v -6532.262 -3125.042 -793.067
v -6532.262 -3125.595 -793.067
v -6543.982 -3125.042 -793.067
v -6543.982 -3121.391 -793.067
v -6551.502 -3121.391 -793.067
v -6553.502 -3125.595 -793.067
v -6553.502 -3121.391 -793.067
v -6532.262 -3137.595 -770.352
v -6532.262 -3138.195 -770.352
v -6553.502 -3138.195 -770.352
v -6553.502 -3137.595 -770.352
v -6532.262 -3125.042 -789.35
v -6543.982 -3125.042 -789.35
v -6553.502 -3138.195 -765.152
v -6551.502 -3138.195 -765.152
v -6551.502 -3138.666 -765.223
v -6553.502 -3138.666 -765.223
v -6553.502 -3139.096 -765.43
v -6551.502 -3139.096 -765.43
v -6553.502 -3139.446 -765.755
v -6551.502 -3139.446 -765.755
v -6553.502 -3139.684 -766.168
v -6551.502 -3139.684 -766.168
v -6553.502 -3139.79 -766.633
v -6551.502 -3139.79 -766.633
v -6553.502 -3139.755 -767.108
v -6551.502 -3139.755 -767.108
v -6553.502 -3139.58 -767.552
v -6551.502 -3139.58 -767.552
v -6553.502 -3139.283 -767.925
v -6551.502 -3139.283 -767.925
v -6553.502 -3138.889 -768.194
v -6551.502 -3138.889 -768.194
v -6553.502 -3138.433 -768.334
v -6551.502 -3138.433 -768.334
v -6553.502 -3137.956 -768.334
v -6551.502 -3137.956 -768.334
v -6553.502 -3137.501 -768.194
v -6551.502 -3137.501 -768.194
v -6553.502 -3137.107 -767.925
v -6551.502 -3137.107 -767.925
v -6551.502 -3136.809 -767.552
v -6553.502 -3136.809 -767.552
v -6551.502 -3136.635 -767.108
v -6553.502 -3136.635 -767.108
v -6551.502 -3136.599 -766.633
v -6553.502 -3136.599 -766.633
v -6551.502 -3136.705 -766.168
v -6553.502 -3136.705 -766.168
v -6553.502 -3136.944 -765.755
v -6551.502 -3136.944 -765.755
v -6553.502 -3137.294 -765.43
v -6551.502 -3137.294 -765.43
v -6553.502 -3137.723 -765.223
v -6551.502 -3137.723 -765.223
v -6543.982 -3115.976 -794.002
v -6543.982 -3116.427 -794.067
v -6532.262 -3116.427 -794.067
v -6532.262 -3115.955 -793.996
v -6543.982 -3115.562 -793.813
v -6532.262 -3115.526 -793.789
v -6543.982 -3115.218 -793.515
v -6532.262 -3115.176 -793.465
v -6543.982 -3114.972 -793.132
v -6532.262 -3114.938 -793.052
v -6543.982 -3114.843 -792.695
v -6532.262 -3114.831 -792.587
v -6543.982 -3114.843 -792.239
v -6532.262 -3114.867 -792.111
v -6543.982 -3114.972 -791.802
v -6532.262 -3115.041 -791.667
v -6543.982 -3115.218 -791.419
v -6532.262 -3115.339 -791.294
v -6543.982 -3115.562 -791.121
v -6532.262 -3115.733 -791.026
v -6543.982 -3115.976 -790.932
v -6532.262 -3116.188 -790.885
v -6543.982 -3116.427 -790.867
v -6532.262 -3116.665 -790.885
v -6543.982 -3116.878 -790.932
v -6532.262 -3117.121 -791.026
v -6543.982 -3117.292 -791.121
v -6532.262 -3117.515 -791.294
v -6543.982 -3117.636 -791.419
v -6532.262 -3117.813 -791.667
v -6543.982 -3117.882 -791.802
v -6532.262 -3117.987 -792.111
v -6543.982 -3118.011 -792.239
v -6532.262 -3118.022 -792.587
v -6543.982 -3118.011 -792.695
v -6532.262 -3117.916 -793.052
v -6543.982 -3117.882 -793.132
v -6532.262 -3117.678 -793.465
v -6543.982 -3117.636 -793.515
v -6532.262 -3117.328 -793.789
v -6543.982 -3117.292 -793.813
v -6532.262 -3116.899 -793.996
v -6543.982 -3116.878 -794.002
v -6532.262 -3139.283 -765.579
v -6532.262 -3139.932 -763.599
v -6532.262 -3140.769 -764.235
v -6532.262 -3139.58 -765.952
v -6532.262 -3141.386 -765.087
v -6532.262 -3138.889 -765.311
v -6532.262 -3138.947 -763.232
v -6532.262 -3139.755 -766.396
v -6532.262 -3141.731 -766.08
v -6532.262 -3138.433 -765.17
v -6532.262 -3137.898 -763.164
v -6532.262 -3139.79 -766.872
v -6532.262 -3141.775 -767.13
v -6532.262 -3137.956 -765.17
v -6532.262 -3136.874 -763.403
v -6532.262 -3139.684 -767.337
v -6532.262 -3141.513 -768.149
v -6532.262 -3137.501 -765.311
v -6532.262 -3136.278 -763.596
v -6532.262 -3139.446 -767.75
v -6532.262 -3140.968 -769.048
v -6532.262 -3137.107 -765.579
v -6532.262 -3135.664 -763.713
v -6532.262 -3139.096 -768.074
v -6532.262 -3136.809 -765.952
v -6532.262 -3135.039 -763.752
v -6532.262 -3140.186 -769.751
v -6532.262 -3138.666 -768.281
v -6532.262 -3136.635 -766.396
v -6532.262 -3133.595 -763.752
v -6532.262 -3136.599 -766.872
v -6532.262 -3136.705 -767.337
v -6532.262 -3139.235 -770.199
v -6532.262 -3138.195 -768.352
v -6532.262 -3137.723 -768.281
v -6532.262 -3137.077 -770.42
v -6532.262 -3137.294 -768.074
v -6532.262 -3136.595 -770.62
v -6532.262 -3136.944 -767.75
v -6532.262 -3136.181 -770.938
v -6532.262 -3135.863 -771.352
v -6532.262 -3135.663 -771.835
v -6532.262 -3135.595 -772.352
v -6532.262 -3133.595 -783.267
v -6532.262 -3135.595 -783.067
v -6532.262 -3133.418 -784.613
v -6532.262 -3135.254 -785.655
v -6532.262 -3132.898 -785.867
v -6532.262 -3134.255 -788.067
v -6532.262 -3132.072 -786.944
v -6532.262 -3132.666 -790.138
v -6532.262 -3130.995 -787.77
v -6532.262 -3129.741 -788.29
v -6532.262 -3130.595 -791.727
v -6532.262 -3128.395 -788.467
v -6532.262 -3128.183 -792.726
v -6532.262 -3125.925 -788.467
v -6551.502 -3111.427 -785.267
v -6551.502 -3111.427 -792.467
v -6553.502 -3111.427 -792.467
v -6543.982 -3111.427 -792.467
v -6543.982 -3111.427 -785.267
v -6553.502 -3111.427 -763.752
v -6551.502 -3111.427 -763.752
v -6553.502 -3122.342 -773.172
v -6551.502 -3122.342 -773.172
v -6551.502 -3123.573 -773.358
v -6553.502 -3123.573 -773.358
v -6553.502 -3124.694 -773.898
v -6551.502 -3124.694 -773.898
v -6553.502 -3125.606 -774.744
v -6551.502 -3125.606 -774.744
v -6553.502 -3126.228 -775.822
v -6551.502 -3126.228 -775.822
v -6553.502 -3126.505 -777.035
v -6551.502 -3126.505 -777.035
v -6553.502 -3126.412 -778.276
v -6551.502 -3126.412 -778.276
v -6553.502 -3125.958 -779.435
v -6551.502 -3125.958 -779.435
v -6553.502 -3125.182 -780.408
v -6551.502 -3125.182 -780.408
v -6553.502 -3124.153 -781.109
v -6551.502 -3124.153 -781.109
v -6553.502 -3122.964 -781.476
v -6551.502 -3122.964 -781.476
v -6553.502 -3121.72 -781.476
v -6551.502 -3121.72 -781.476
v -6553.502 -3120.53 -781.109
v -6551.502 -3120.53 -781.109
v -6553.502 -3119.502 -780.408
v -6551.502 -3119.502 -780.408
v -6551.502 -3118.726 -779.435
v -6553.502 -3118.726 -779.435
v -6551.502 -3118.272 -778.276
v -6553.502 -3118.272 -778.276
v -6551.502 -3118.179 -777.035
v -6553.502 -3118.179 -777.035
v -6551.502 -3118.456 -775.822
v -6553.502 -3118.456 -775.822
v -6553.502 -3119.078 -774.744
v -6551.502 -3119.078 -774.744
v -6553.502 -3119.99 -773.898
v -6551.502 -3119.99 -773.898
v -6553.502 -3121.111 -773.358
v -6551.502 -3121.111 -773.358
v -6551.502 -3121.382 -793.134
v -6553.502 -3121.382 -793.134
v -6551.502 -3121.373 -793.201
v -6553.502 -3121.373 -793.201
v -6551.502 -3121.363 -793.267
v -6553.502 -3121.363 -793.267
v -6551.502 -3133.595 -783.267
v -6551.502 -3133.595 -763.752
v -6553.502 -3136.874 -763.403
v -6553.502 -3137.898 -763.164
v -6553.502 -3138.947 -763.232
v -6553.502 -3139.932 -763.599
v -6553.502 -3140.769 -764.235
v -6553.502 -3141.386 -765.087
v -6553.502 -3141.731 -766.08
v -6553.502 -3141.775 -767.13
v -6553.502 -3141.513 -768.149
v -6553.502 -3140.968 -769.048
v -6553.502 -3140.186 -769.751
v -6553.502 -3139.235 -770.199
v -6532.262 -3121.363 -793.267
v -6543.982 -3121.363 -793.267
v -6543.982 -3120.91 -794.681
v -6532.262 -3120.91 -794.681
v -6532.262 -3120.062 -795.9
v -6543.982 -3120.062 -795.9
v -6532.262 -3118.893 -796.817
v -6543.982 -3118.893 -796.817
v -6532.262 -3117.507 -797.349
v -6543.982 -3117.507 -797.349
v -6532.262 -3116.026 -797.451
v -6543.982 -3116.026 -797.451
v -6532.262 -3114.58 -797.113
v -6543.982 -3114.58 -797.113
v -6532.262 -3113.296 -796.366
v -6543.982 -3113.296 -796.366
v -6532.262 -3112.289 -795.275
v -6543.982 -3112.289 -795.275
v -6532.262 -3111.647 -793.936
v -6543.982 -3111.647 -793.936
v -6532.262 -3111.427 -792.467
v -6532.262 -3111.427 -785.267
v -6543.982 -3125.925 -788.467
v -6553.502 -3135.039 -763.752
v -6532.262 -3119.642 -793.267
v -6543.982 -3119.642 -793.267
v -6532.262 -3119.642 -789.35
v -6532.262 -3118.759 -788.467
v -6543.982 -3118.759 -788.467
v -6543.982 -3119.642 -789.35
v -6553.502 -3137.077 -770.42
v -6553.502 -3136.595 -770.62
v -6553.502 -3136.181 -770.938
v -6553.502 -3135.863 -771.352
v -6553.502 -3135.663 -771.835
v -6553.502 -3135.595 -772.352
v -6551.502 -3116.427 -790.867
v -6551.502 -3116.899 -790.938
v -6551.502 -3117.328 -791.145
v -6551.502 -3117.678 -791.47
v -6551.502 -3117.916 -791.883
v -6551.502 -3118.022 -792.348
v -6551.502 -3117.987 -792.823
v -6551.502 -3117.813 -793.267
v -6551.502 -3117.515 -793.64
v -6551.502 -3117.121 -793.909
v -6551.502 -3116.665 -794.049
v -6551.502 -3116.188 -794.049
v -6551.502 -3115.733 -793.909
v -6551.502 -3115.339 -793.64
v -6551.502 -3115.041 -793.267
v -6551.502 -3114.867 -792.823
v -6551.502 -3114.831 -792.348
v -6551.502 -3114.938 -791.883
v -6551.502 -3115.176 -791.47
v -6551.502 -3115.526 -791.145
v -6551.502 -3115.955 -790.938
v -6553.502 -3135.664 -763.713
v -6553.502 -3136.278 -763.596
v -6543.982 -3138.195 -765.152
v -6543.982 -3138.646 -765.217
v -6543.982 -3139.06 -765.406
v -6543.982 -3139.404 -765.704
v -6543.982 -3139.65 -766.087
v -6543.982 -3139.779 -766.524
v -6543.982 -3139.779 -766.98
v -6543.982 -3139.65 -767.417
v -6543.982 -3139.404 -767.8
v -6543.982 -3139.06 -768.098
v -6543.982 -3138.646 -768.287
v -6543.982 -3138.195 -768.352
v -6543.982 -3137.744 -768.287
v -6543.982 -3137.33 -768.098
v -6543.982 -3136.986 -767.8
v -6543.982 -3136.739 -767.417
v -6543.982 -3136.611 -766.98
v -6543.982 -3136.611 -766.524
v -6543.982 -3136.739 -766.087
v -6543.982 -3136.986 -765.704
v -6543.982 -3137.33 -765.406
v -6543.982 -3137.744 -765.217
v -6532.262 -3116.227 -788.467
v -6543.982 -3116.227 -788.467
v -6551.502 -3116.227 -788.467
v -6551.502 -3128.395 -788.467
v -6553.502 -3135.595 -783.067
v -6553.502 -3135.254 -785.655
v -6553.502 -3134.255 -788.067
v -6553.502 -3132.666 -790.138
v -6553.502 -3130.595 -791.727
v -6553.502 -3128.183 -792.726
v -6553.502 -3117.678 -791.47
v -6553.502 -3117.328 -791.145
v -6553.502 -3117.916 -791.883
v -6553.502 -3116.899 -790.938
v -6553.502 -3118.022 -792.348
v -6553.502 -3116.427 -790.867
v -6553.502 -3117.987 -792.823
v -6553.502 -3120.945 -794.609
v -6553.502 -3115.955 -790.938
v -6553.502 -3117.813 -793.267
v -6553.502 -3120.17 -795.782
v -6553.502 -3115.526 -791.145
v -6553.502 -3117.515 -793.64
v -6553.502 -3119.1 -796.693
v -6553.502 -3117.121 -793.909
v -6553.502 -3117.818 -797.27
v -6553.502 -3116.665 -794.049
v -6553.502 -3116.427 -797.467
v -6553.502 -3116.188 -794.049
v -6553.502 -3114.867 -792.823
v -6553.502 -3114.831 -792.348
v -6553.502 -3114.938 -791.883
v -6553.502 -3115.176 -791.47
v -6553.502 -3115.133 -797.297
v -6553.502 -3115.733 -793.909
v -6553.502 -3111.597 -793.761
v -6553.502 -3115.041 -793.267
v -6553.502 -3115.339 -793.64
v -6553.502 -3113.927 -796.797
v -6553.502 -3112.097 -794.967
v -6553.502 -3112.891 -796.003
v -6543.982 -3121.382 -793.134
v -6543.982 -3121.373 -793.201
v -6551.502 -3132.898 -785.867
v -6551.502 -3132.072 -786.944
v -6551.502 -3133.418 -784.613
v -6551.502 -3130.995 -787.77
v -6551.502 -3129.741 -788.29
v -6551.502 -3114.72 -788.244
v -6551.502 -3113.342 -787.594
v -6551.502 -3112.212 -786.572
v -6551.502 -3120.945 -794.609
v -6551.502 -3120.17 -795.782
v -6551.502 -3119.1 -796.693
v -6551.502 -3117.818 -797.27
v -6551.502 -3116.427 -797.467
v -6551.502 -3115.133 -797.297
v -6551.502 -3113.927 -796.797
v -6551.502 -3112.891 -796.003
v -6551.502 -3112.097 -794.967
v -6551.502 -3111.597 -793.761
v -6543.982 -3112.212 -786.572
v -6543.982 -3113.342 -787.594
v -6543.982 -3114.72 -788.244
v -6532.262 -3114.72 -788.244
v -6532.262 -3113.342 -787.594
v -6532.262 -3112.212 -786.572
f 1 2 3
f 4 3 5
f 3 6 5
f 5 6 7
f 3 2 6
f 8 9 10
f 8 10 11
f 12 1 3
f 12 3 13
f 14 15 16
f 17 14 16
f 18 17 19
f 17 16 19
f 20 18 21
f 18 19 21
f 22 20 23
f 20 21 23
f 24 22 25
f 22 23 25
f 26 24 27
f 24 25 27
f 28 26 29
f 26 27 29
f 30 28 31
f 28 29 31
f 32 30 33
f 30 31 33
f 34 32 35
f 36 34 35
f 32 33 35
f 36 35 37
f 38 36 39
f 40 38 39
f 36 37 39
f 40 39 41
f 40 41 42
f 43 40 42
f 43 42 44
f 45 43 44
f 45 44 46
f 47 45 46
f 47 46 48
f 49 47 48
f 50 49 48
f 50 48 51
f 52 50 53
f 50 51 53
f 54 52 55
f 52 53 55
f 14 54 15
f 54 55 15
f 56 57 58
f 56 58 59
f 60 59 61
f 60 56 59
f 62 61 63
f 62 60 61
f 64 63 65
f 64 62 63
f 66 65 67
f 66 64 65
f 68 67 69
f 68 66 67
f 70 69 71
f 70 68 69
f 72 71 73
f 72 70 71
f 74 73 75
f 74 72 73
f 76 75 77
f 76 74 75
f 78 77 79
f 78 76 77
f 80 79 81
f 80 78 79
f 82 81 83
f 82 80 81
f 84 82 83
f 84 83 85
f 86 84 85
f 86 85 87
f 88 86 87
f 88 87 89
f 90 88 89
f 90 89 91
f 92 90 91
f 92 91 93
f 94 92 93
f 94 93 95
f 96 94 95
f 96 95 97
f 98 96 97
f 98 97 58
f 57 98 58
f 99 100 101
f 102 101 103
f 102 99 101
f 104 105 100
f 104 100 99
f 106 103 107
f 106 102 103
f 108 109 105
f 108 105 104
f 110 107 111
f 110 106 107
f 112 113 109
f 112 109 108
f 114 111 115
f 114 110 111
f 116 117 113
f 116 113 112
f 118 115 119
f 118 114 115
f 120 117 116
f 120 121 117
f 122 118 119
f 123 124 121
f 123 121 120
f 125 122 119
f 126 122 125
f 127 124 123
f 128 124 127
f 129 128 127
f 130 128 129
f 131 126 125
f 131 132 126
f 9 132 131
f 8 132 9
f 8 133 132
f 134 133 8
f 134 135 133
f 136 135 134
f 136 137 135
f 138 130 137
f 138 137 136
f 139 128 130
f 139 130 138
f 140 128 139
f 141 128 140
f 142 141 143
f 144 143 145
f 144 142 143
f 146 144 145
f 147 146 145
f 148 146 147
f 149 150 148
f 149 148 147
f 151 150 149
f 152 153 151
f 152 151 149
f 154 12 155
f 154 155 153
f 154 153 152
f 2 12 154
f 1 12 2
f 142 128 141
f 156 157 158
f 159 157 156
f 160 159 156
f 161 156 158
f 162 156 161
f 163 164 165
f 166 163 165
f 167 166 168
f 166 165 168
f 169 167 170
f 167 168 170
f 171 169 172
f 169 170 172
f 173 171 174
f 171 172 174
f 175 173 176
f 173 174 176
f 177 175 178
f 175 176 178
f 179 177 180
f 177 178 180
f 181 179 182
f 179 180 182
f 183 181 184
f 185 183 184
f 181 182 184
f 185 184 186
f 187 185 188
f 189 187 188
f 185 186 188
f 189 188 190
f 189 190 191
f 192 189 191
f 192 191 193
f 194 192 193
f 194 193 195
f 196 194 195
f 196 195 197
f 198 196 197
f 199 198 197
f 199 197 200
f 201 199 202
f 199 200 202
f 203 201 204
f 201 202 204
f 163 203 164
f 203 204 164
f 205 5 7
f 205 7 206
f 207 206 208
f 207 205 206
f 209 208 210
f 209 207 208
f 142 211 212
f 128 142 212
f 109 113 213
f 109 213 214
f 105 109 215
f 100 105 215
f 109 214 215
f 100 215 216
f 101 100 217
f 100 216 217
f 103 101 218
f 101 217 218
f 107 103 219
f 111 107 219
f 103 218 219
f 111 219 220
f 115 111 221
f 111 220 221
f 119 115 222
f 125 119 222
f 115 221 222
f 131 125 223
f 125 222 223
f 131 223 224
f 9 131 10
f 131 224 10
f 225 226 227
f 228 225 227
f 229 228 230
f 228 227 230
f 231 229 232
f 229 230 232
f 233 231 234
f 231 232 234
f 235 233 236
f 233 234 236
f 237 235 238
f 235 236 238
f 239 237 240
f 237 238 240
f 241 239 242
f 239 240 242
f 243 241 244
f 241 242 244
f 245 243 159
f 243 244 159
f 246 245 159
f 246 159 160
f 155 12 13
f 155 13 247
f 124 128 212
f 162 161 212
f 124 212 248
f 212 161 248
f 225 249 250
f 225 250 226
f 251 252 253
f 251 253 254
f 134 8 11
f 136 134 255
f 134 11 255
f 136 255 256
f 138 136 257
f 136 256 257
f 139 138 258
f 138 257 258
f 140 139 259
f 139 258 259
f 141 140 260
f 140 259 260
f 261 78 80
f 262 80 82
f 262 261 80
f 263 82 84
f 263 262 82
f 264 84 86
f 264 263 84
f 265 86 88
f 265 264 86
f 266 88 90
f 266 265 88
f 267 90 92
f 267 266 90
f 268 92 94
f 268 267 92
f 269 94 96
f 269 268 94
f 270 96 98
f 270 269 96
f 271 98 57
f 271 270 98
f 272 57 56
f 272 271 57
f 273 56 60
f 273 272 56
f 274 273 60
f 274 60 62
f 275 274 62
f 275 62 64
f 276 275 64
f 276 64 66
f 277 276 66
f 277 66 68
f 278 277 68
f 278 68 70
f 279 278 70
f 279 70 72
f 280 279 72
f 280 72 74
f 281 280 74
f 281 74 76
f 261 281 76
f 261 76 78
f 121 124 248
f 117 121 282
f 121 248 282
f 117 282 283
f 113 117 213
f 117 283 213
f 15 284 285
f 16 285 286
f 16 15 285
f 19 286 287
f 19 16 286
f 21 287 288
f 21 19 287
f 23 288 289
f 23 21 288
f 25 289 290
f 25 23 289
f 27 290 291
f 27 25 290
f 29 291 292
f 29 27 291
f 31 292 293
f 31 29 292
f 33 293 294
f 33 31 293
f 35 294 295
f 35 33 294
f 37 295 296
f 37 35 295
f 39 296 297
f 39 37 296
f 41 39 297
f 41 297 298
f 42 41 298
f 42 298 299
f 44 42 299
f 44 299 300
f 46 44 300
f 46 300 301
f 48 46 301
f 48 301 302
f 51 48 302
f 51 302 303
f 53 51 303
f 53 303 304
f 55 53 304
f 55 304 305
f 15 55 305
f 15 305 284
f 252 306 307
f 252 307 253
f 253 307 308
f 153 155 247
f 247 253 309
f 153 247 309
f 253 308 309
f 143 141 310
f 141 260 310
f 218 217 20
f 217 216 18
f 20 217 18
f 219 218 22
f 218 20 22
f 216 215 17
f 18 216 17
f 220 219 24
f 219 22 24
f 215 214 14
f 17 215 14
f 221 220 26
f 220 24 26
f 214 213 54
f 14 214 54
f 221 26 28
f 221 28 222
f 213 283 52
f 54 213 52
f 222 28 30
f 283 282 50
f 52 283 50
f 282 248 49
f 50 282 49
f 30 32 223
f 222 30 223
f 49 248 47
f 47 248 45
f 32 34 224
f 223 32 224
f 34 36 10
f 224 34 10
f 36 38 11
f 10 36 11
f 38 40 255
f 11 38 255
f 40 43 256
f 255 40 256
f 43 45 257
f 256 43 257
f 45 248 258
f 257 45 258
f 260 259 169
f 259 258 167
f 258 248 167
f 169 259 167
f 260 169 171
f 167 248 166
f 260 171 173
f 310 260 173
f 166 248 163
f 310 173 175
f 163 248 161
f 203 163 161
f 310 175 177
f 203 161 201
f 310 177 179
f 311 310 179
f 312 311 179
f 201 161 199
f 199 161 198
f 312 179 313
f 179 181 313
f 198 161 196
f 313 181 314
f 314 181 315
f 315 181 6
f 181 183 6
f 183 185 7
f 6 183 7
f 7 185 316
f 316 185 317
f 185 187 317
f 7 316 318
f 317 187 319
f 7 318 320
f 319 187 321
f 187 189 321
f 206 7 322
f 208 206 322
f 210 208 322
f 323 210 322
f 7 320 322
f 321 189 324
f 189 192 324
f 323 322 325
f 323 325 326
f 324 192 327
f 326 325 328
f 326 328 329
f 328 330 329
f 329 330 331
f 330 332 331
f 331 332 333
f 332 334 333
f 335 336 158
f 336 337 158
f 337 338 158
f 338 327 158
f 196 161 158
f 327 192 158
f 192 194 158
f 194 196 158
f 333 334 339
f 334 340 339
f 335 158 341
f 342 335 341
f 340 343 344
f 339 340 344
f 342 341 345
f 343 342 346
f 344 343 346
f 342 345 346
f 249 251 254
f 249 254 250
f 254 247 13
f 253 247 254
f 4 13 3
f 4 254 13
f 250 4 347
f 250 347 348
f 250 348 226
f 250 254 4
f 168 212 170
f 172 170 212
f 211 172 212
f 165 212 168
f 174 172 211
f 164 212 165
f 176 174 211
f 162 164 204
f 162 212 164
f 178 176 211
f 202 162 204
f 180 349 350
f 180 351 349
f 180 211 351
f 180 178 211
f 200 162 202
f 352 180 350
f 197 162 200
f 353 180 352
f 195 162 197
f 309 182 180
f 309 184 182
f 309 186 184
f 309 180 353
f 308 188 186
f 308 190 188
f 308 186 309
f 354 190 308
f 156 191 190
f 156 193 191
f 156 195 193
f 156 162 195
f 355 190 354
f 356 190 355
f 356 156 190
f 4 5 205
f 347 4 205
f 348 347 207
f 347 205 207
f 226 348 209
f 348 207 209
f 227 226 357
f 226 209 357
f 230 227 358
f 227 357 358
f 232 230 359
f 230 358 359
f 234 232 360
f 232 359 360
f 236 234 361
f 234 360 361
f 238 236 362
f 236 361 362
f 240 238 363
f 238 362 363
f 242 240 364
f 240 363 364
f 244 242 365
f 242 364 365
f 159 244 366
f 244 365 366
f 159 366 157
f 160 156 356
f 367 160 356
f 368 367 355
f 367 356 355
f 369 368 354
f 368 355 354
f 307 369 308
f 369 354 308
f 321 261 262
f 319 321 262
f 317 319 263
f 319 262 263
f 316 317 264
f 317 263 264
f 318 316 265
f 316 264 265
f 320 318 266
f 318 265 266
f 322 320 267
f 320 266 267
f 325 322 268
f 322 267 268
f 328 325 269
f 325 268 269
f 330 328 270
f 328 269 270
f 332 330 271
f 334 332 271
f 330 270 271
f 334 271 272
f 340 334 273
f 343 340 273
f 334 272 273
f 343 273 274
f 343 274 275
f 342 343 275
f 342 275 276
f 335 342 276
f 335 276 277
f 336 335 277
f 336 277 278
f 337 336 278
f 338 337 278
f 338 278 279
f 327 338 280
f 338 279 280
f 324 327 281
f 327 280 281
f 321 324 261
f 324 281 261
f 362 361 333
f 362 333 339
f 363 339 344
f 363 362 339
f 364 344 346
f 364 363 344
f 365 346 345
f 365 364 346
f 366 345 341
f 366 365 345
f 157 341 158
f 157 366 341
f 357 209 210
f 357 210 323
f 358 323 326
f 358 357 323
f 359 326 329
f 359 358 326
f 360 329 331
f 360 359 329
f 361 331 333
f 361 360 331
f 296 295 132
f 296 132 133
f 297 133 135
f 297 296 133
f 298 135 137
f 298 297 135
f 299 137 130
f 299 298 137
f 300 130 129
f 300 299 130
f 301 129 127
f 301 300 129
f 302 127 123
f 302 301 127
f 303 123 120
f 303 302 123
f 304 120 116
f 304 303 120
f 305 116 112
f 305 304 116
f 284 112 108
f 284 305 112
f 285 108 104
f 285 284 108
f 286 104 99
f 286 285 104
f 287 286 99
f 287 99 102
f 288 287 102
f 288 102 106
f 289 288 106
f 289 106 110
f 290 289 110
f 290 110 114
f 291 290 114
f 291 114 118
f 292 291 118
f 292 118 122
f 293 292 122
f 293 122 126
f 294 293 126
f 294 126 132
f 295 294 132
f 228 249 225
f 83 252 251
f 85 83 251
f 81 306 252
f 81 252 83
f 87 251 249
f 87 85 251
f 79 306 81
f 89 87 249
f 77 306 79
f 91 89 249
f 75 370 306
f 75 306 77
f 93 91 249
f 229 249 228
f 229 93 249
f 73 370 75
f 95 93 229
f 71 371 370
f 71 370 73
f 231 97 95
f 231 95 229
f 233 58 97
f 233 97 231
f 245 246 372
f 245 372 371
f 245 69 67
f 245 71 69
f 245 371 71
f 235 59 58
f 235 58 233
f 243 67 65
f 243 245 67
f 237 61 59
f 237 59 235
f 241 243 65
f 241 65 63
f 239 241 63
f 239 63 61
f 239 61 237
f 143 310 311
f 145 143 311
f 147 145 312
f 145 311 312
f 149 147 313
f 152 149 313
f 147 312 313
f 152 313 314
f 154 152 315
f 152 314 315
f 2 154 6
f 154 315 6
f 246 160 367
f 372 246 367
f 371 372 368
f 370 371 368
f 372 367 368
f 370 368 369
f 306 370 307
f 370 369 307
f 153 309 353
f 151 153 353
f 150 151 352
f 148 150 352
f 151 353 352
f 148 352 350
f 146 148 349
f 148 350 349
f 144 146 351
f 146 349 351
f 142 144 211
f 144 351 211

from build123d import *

# Parameters (mm, degrees)
BOSS_EXTRUDE1_START = -0.2
SKETCH1_R           = 1.6
BOSS_EXTRUDE1_DEPTH = 7.520002
BOSS_EXTRUDE2_START = -0.2
SKETCH1_7_R         = 1.6
SKETCH1_7_R_2       = 1.995
SKETCH1_7_R_3       = 4.175
SKETCH1_7_R_4       = 1.845
BOSS_EXTRUDE2_DEPTH = 2
BOSS_EXTRUDE3_START = 7.320002
SKETCH1_8_R         = 1.6
BOSS_EXTRUDE3_DEPTH = 11.720001513


with BuildPart() as part:
    # Sketch1 → Boss-Extrude1 (new body)
    with BuildSketch(Plane(origin=(-6551.301651172, 0, 0), x_dir=(0, 0, -1), z_dir=(1, 0, 0)).offset(BOSS_EXTRUDE1_START)):
        with BuildLine():
            Line((783.267150495, -3133.594839225), (763.752150495, -3133.594839225))
            Line((763.752150495, -3133.594839225), (763.752150495, -3135.038892457))
            ThreePointArc((763.752150495, -3135.038892457), (763.664167085, -3135.972751667), (763.403313286, -3136.873745229))
            ThreePointArc((763.403313286, -3136.873745229), (766.079771865, -3141.73149117), (770.352150495, -3138.194839225))
            Line((770.352150495, -3138.194839225), (770.352150495, -3137.594839225))
            ThreePointArc((770.352150495, -3137.594839225), (770.937936933, -3136.180625663), (772.352150495, -3135.594839225))
            Line((772.352150495, -3135.594839225), (783.067150495, -3135.594839225))
            ThreePointArc((783.067150495, -3135.594839225), (790.138218307, -3132.665907037), (793.067150495, -3125.594839225))
            Line((793.067150495, -3125.594839225), (793.067150495, -3121.390787525))
            ThreePointArc((793.067150495, -3121.390787525), (797.458109686, -3116.126374636), (792.467150495, -3111.426918067))
            Line((792.467150495, -3111.426918067), (785.267150495, -3111.426918067))
            ThreePointArc((785.267150495, -3111.426918067), (787.593812026, -3113.342477046), (788.467150495, -3116.226918067))
            Line((788.467150495, -3116.226918067), (788.467150495, -3128.394839225))
            ThreePointArc((788.467150495, -3128.394839225), (786.944105758, -3132.071794487), (783.267150495, -3133.594839225))
        make_face()
        with Locations(Location((766.752150495, -3138.194839225, 0), (0, 0, 180))):
            Circle(SKETCH1_R, mode=Mode.SUBTRACT)
        with Locations(Location((792.467150495, -3116.426918067, 0), (0, 0, 180))):
            Circle(SKETCH1_R, mode=Mode.SUBTRACT)
    extrude(amount=BOSS_EXTRUDE1_DEPTH)

    # Sketch1<7> → Boss-Extrude2 (add)
    with BuildSketch(Plane(origin=(-6551.301651172, 0, 0), x_dir=(0, 0, -1), z_dir=(1, 0, 0)).offset(BOSS_EXTRUDE2_START)):
        with BuildLine():
            Line((792.467150495, -3111.426918067), (785.267150495, -3111.426918067))
            ThreePointArc((785.267150495, -3111.426918067), (786.906779124, -3112.513011303), (788.025771185, -3114.130366343))
            ThreePointArc((788.025771185, -3114.130366343), (789.867415761, -3112.155925289), (792.467150495, -3111.426918067))
        make_face()
        with BuildLine():
            ThreePointArc((797.467150495, -3116.426918067), (796.002684401, -3112.891384161), (792.467150495, -3111.426918067))
            ThreePointArc((792.467150495, -3111.426918067), (789.867415761, -3112.155925289), (788.025771185, -3114.130366343))
            ThreePointArc((788.025771185, -3114.130366343), (788.355609377, -3115.155663565), (788.467150495, -3116.226918067))
            Line((788.467150495, -3116.226918067), (788.467150495, -3118.759075354))
            Line((788.467150495, -3118.759075354), (789.349993208, -3119.641918067))
            Line((789.349993208, -3119.641918067), (793.267150495, -3119.641918067))
            Line((793.267150495, -3119.641918067), (793.267150495, -3121.362503138))
            ThreePointArc((793.267150495, -3121.362503138), (796.275037048, -3119.667288416), (797.467150495, -3116.426918067))
        make_face()
        with Locations(Location((792.467150495, -3116.426918067, 0), (0, 0, 180))):
            Circle(SKETCH1_7_R, mode=Mode.SUBTRACT)
        with BuildLine():
            ThreePointArc((788.025771185, -3114.130366343), (787.802673468, -3114.626180978), (787.634729413, -3115.143287871))
            ThreePointArc((787.634729413, -3115.143287871), (787.733922547, -3115.681072451), (787.767150495, -3116.226918067))
            Line((787.767150495, -3116.226918067), (787.767150495, -3118.132790278))
            ThreePointArc((787.767150495, -3118.132790278), (788.069288323, -3118.805743053), (788.467150495, -3119.426918067))
            Line((788.467150495, -3119.426918067), (788.467150495, -3118.759075354))
            Line((788.467150495, -3118.759075354), (788.467150495, -3116.226918067))
            ThreePointArc((788.467150495, -3116.226918067), (788.355609377, -3115.155663565), (788.025771185, -3114.130366343))
        make_face()
        with BuildLine():
            Line((788.467150495, -3118.759075354), (788.467150495, -3119.426918067))
            ThreePointArc((788.467150495, -3119.426918067), (790.503939908, -3121.025374785), (793.067150495, -3121.390787525))
            ThreePointArc((793.067150495, -3121.390787525), (793.167293339, -3121.377655385), (793.267150495, -3121.362503138))
            Line((793.267150495, -3121.362503138), (793.267150495, -3119.641918067))
            Line((793.267150495, -3119.641918067), (789.349993208, -3119.641918067))
            Line((789.349993208, -3119.641918067), (788.467150495, -3118.759075354))
        make_face()
        with BuildLine():
            Line((788.467150495, -3119.426918067), (788.467150495, -3125.924760779))
            Line((788.467150495, -3125.924760779), (789.349993208, -3125.041918067))
            Line((789.349993208, -3125.041918067), (793.067150495, -3125.041918067))
            Line((793.067150495, -3125.041918067), (793.067150495, -3121.390787525))
            ThreePointArc((793.067150495, -3121.390787525), (790.503939908, -3121.025374785), (788.467150495, -3119.426918067))
        make_face()
        with BuildLine():
            Line((783.267150495, -3133.594839225), (763.752150495, -3133.594839225))
            Line((763.752150495, -3133.594839225), (763.752150495, -3135.038892457))
            ThreePointArc((763.752150495, -3135.038892457), (763.664167085, -3135.972751667), (763.403313286, -3136.873745229))
            ThreePointArc((763.403313286, -3136.873745229), (766.079771865, -3141.73149117), (770.352150495, -3138.194839225))
            Line((770.352150495, -3138.194839225), (770.352150495, -3137.594839225))
            ThreePointArc((770.352150495, -3137.594839225), (770.937936933, -3136.180625663), (772.352150495, -3135.594839225))
            Line((772.352150495, -3135.594839225), (783.067150495, -3135.594839225))
            ThreePointArc((783.067150495, -3135.594839225), (790.138218307, -3132.665907037), (793.067150495, -3125.594839225))
            Line((793.067150495, -3125.594839225), (793.067150495, -3125.041918067))
            Line((793.067150495, -3125.041918067), (789.349993208, -3125.041918067))
            Line((789.349993208, -3125.041918067), (788.467150495, -3125.924760779))
            Line((788.467150495, -3125.924760779), (788.467150495, -3128.394839225))
            ThreePointArc((788.467150495, -3128.394839225), (786.944105758, -3132.071794487), (783.267150495, -3133.594839225))
        make_face()
        with Locations(Location((766.752150495, -3138.194839225, 0), (0, 0, 180))):
            Circle(SKETCH1_7_R, mode=Mode.SUBTRACT)
        with BuildLine():
            Line((763.752150495, -3111.726918067), (763.752150495, -3132.894839225))
            Line((763.752150495, -3132.894839225), (783.267150495, -3132.894839225))
            ThreePointArc((783.267150495, -3132.894839225), (786.449131011, -3131.57681974), (787.767150495, -3128.394839225))
            Line((787.767150495, -3128.394839225), (787.767150495, -3118.132790278))
            ThreePointArc((787.767150495, -3118.132790278), (787.472048486, -3116.648177904), (787.634729413, -3115.143287871))
            ThreePointArc((787.634729413, -3115.143287871), (786.039664167, -3112.682462123), (783.267150495, -3111.726918067))
            Line((783.267150495, -3111.726918067), (763.752150495, -3111.726918067))
        make_face()
        with Locations((766.097150495, -3122.341918067)):
            Circle(SKETCH1_7_R_2, mode=Mode.SUBTRACT)
        with Locations(Location((777.347150495, -3122.341918067, 0), (0, 0, 180))):
            Circle(SKETCH1_7_R_3, mode=Mode.SUBTRACT)
        with BuildLine():
            Line((763.752150495, -3132.894839225), (763.752150495, -3133.594839225))
            Line((763.752150495, -3133.594839225), (783.267150495, -3133.594839225))
            ThreePointArc((783.267150495, -3133.594839225), (786.944105758, -3132.071794487), (788.467150495, -3128.394839225))
            Line((788.467150495, -3128.394839225), (788.467150495, -3125.924760779))
            Line((788.467150495, -3125.924760779), (788.467150495, -3119.426918067))
            ThreePointArc((788.467150495, -3119.426918067), (788.069288323, -3118.805743053), (787.767150495, -3118.132790278))
            Line((787.767150495, -3118.132790278), (787.767150495, -3128.394839225))
            ThreePointArc((787.767150495, -3128.394839225), (786.449131011, -3131.57681974), (783.267150495, -3132.894839225))
            Line((783.267150495, -3132.894839225), (763.752150495, -3132.894839225))
        make_face()
        with BuildLine():
            Line((763.752150495, -3111.426918067), (763.752150495, -3111.726918067))
            Line((763.752150495, -3111.726918067), (783.267150495, -3111.726918067))
            ThreePointArc((783.267150495, -3111.726918067), (786.039664167, -3112.682462123), (787.634729413, -3115.143287871))
            ThreePointArc((787.634729413, -3115.143287871), (787.802673468, -3114.626180978), (788.025771185, -3114.130366343))
            ThreePointArc((788.025771185, -3114.130366343), (786.906779124, -3112.513011303), (785.267150495, -3111.426918067))
            Line((785.267150495, -3111.426918067), (763.752150495, -3111.426918067))
        make_face()
        with BuildLine():
            ThreePointArc((787.767150495, -3116.226918067), (787.733922547, -3115.681072451), (787.634729413, -3115.143287871))
            ThreePointArc((787.634729413, -3115.143287871), (787.472048486, -3116.648177904), (787.767150495, -3118.132790278))
            Line((787.767150495, -3118.132790278), (787.767150495, -3116.226918067))
        make_face()
        with Locations((766.097150495, -3122.341918067)):
            Circle(SKETCH1_7_R_2)
        with Locations((766.097150495, -3122.341918067)):
            Circle(SKETCH1_7_R_4, mode=Mode.SUBTRACT)
        with Locations((766.097150495, -3122.341918067)):
            Circle(SKETCH1_7_R_4)
    extrude(amount=-BOSS_EXTRUDE2_DEPTH)

    # Sketch1<8> → Boss-Extrude3 (add)
    with BuildSketch(Plane(origin=(-6551.301651172, 0, 0), x_dir=(0, 0, -1), z_dir=(1, 0, 0)).offset(BOSS_EXTRUDE3_START)):
        with BuildLine():
            Line((783.267150495, -3133.594839225), (763.752150495, -3133.594839225))
            Line((763.752150495, -3133.594839225), (763.752150495, -3135.038892457))
            ThreePointArc((763.752150495, -3135.038892457), (763.664167085, -3135.972751667), (763.403313286, -3136.873745229))
            ThreePointArc((763.403313286, -3136.873745229), (766.079771865, -3141.73149117), (770.352150495, -3138.194839225))
            Line((770.352150495, -3138.194839225), (770.352150495, -3137.594839225))
            ThreePointArc((770.352150495, -3137.594839225), (770.937936933, -3136.180625663), (772.352150495, -3135.594839225))
            Line((772.352150495, -3135.594839225), (783.067150495, -3135.594839225))
            ThreePointArc((783.067150495, -3135.594839225), (790.138218307, -3132.665907037), (793.067150495, -3125.594839225))
            Line((793.067150495, -3125.594839225), (793.067150495, -3125.041918067))
            Line((793.067150495, -3125.041918067), (789.349993208, -3125.041918067))
            Line((789.349993208, -3125.041918067), (788.467150495, -3125.924760779))
            Line((788.467150495, -3125.924760779), (788.467150495, -3128.394839225))
            ThreePointArc((788.467150495, -3128.394839225), (786.944105758, -3132.071794487), (783.267150495, -3133.594839225))
        make_face()
        with Locations((766.752150495, -3138.194839225)):
            Circle(SKETCH1_8_R, mode=Mode.SUBTRACT)
        with BuildLine():
            Line((792.467150495, -3111.426918067), (785.267150495, -3111.426918067))
            ThreePointArc((785.267150495, -3111.426918067), (787.593812026, -3113.342477046), (788.467150495, -3116.226918067))
            Line((788.467150495, -3116.226918067), (788.467150495, -3118.759075354))
            Line((788.467150495, -3118.759075354), (789.349993208, -3119.641918067))
            Line((789.349993208, -3119.641918067), (793.267150495, -3119.641918067))
            Line((793.267150495, -3119.641918067), (793.267150495, -3121.362503138))
            ThreePointArc((793.267150495, -3121.362503138), (797.451020747, -3116.025623511), (792.467150495, -3111.426918067))
        make_face()
        with Locations((792.467150495, -3116.426918067)):
            Circle(SKETCH1_8_R, mode=Mode.SUBTRACT)
    extrude(amount=BOSS_EXTRUDE3_DEPTH)


solid = part.part
